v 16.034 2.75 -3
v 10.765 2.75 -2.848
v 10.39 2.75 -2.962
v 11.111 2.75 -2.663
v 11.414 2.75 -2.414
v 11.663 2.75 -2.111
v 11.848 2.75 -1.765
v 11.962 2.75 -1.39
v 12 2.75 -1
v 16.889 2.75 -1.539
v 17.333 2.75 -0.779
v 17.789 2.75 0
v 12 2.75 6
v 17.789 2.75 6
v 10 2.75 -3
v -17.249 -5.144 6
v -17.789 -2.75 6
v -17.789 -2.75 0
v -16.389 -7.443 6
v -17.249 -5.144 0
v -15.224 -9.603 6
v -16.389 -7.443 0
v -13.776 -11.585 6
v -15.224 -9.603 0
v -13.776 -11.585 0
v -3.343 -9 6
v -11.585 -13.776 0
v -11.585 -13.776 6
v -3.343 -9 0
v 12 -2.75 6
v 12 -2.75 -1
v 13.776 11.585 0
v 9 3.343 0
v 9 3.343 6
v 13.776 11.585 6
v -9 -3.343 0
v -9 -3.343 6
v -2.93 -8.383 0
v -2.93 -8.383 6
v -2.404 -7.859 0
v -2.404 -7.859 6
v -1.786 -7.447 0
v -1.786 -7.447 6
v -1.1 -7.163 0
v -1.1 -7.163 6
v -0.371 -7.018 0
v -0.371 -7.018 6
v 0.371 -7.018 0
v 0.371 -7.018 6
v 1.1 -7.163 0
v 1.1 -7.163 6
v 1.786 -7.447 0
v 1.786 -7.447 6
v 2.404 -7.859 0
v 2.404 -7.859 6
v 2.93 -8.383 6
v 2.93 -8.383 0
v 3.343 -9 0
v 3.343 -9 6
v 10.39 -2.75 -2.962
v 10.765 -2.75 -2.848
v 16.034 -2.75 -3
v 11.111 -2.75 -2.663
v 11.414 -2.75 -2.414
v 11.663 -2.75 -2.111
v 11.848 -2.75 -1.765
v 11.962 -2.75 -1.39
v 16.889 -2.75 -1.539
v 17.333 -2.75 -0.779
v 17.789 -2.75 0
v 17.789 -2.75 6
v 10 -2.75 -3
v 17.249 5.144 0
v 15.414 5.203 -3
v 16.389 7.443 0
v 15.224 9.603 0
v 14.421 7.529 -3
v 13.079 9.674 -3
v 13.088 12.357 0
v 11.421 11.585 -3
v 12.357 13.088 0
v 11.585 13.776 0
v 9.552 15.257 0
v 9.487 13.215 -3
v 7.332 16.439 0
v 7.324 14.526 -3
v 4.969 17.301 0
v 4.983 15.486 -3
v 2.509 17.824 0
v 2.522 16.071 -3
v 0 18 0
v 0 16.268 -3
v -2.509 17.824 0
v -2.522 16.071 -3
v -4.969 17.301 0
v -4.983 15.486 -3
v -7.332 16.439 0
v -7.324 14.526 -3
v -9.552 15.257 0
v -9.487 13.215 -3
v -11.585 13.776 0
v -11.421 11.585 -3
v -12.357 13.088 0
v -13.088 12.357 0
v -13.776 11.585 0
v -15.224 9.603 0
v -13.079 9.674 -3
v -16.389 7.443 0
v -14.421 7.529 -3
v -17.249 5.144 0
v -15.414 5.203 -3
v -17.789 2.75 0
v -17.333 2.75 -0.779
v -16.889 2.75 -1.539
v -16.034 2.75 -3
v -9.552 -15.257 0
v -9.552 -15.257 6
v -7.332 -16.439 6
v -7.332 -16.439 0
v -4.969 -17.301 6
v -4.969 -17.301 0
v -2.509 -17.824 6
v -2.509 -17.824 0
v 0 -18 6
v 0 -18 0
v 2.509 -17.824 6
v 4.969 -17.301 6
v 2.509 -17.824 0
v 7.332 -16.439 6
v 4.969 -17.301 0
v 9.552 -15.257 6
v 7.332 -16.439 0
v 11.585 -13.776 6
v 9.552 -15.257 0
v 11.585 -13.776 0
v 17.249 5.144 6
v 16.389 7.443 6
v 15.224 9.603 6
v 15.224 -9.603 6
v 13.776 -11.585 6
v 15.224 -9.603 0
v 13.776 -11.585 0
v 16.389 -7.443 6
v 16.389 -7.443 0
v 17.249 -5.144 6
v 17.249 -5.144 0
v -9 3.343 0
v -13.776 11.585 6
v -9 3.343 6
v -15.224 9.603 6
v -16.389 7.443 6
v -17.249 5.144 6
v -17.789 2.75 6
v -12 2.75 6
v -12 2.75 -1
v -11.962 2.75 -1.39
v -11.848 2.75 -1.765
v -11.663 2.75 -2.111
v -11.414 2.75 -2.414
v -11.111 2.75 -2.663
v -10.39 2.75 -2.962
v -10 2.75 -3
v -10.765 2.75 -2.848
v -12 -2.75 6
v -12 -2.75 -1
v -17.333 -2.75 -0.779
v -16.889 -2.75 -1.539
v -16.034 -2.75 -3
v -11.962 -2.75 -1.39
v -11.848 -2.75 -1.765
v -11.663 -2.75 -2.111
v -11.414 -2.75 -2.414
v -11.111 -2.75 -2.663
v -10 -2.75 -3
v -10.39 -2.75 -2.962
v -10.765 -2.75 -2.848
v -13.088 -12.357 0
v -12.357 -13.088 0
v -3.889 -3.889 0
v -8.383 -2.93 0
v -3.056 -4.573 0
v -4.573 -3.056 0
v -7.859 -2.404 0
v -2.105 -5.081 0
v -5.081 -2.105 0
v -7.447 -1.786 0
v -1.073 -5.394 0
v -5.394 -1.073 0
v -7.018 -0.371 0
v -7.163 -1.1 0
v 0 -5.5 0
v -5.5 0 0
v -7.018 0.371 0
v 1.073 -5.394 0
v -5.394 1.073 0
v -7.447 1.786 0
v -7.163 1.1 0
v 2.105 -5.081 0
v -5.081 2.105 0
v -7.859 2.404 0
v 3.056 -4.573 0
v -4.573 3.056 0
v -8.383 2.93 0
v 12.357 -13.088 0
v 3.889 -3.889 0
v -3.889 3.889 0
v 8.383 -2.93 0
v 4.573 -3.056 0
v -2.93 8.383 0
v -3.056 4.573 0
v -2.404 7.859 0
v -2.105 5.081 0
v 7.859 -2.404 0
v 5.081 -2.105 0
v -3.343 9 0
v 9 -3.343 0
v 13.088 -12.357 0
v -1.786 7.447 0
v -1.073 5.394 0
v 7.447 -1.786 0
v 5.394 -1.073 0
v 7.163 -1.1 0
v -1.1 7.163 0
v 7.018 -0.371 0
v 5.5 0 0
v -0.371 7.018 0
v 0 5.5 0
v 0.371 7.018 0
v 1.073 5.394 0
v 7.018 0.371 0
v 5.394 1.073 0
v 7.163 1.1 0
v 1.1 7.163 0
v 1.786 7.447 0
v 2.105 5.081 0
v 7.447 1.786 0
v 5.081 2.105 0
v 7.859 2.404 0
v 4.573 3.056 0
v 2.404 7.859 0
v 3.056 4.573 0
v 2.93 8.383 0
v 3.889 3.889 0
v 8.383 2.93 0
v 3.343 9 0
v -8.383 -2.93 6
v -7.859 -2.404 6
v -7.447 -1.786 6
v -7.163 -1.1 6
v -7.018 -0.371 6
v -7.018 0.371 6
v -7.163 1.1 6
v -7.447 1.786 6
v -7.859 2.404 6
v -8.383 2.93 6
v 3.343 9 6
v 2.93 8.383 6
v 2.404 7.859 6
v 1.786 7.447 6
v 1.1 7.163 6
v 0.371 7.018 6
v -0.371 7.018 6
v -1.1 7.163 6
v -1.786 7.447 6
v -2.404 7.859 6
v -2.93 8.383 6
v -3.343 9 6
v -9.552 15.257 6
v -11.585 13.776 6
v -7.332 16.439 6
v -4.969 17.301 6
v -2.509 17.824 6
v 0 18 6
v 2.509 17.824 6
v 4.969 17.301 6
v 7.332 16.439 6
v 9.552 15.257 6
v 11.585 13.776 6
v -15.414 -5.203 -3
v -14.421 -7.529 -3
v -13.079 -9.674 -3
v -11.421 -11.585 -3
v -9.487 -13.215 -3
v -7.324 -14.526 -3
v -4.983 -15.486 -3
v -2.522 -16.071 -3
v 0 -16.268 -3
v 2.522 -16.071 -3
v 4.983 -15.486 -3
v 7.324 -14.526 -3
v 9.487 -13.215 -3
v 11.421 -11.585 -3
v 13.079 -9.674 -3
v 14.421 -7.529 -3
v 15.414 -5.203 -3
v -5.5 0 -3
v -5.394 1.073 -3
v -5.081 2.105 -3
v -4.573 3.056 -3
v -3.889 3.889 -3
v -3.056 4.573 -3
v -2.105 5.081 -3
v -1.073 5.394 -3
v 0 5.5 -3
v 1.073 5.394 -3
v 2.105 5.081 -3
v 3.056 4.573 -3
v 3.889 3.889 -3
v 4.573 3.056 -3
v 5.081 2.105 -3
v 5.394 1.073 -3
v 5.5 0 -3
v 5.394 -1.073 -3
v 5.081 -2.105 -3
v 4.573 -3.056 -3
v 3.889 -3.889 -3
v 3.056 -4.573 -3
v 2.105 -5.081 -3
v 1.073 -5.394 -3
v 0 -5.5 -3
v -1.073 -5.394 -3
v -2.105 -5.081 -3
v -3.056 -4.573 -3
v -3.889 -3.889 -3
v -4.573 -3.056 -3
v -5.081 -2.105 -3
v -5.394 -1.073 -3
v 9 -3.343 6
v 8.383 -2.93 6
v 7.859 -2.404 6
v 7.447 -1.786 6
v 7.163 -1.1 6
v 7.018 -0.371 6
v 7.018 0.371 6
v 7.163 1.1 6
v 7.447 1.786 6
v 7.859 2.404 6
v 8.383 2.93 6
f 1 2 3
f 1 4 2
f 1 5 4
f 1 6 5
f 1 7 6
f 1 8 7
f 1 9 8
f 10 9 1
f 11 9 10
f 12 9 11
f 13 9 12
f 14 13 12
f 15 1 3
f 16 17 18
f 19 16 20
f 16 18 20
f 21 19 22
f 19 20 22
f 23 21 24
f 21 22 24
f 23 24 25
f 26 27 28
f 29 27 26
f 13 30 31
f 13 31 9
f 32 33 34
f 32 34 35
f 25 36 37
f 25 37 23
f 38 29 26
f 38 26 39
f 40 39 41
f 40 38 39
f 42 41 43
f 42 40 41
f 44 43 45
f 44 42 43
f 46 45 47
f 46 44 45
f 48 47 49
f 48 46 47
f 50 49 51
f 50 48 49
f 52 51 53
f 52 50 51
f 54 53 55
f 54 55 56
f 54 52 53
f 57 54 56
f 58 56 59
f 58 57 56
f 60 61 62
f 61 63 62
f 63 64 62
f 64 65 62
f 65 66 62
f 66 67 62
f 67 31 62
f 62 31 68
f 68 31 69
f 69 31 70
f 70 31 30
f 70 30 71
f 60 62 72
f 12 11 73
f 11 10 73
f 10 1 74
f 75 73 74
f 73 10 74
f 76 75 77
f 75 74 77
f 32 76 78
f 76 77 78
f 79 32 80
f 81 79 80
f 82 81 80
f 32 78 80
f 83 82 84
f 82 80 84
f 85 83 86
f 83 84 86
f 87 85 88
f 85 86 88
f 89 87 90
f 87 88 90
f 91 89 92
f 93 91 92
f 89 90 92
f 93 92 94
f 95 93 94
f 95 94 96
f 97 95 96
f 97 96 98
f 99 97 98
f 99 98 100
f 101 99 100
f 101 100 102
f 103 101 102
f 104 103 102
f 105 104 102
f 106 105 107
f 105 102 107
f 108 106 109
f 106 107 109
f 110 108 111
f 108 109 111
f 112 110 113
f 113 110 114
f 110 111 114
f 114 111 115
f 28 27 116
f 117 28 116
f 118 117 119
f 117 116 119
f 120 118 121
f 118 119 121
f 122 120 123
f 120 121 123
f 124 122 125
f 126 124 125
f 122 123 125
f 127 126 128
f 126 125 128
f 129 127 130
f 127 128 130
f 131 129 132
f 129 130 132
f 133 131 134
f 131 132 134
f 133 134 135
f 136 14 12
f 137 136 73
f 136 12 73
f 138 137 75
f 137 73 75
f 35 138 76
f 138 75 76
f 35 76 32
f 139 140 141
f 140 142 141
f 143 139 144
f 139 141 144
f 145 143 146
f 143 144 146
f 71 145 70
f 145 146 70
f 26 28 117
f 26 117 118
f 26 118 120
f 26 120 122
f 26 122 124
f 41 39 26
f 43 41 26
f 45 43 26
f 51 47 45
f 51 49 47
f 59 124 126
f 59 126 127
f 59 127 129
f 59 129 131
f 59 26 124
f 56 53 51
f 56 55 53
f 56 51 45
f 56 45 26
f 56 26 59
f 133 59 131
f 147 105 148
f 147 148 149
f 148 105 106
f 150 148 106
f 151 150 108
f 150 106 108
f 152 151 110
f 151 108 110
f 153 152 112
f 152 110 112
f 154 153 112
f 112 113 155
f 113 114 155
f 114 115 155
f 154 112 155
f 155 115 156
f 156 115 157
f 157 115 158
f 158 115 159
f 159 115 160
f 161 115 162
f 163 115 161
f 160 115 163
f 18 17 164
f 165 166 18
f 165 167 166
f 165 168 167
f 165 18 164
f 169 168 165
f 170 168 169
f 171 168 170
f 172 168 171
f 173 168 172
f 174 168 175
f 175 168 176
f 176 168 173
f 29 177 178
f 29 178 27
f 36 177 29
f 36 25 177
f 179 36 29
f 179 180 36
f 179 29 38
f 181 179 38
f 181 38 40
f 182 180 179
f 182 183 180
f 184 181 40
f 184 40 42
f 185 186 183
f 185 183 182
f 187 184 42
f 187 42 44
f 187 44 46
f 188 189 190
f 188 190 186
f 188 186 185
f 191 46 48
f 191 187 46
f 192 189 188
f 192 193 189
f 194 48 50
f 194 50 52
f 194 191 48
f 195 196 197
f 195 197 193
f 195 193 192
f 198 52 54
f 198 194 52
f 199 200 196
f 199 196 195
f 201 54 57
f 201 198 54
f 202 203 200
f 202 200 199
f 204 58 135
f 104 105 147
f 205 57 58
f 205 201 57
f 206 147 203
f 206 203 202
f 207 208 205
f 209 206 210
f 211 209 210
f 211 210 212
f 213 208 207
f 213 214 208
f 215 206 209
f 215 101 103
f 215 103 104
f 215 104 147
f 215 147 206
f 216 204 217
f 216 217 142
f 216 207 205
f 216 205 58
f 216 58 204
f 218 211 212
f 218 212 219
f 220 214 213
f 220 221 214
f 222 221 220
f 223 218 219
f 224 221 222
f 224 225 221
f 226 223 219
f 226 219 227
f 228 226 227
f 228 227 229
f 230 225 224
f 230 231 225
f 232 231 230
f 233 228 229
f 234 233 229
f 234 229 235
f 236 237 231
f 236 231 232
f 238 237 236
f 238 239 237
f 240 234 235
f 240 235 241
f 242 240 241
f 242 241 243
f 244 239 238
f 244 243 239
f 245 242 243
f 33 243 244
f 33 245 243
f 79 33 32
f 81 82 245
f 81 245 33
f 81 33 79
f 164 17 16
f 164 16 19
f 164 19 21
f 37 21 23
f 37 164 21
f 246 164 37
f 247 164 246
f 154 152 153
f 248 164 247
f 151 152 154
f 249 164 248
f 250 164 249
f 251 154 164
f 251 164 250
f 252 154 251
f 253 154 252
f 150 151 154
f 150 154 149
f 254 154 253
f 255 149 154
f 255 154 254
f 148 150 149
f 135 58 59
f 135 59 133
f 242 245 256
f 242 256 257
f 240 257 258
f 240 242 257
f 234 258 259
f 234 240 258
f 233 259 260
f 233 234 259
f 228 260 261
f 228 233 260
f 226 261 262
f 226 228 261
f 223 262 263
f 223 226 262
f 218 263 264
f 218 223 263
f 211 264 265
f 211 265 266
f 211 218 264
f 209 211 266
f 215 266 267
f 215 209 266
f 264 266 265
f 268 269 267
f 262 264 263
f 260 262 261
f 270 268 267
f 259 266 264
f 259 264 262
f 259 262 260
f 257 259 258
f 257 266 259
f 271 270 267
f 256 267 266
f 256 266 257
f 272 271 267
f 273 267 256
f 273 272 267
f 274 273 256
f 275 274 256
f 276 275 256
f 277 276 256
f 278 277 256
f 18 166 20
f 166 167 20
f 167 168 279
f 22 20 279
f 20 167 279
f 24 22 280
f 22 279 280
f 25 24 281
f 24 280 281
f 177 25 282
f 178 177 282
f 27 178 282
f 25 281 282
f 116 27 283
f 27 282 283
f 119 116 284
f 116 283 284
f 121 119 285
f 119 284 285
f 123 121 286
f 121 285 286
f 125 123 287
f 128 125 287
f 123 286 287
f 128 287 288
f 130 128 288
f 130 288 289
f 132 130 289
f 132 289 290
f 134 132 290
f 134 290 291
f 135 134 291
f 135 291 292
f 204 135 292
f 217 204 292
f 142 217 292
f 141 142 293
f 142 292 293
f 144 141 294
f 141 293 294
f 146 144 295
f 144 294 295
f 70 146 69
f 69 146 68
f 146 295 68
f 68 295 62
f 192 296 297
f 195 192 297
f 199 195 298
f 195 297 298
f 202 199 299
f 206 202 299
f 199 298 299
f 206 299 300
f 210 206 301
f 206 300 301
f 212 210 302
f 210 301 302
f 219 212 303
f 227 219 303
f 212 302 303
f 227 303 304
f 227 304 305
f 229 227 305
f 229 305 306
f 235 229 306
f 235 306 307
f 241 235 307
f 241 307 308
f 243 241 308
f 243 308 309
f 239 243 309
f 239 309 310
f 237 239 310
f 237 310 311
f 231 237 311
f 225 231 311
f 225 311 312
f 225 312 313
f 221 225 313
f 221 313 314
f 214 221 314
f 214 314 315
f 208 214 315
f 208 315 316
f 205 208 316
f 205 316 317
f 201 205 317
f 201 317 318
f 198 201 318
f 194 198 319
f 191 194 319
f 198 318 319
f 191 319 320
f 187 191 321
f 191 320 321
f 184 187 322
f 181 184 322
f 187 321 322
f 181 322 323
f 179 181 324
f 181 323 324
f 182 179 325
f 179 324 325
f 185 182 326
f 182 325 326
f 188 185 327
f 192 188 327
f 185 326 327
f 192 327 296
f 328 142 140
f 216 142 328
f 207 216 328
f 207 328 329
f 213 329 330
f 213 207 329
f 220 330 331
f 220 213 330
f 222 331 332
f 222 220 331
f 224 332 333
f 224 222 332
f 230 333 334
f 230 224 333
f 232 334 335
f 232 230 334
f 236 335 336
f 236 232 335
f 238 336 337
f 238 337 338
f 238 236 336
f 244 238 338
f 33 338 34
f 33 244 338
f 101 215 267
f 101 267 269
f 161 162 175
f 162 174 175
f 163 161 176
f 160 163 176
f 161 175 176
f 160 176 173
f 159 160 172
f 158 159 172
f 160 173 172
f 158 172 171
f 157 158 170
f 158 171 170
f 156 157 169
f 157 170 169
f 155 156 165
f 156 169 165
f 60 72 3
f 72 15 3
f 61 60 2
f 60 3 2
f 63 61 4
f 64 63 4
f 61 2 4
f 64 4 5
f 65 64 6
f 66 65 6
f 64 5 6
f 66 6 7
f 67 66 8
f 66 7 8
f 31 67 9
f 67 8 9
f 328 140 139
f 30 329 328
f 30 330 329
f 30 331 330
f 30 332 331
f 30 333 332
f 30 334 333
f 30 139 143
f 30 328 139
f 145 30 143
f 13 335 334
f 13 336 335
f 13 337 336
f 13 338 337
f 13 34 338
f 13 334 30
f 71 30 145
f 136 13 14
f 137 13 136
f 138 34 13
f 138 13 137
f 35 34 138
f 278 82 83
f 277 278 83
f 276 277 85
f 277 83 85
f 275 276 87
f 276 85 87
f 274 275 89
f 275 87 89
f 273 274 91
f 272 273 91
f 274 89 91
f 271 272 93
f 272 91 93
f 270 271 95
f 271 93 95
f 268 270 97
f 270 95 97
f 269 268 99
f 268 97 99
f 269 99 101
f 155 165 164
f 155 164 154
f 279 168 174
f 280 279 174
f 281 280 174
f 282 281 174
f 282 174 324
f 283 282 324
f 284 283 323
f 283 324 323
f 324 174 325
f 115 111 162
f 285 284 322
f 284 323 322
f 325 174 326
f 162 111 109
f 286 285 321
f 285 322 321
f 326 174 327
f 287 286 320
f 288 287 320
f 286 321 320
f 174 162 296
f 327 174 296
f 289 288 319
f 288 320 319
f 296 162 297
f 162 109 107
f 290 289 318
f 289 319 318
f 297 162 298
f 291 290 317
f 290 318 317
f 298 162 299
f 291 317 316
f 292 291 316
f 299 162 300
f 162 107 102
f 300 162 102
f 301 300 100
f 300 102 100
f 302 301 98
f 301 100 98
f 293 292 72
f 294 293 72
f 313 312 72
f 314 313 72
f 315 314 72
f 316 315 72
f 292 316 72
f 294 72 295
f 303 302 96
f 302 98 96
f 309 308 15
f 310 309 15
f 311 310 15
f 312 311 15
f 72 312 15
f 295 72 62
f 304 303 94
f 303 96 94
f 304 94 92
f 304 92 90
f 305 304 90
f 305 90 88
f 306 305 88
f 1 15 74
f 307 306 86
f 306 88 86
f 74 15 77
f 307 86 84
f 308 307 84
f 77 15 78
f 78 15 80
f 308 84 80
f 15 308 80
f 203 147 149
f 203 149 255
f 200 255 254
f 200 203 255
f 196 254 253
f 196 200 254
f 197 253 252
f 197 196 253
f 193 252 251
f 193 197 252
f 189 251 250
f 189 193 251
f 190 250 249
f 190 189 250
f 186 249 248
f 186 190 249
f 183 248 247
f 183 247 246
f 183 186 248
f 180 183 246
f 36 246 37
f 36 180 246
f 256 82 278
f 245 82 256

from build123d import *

# Parameters (mm, degrees)
F0_R          = 18
F1_DEPTH      = 6
F1_DEPTH_BACK = 3
F1_TAPER_BACK = 30
F3_DEPTH      = 6.001
F5_D          = 11
F6_W          = 20
F6_H          = 5.5
F7_DEPTH      = 12.5
F8_R          = 2


with BuildPart() as f1:
    # F0 (on Top) → F1 (new body, two sides)
    with BuildSketch(Plane.XY) as f1_sk:
        Circle(F0_R)
    extrude(amount=F1_DEPTH)
    extrude(f1_sk.sketch, amount=-F1_DEPTH_BACK, taper=F1_TAPER_BACK)

    # F2 (on Top) → F3 (cut, through all)
    with BuildSketch(Plane.XY):
        with BuildLine():
            Line((-3.3431457505, 9), (-12.571075856, 14.3476765405))
            ThreePointArc((-12.571075856, 14.3476765405), (-14.1421356237, 14.1421356237), (-14.3476765405, 12.571075856))
            Line((-14.3476765405, 12.571075856), (-9, 3.3431457505))
            ThreePointArc((-9, 3.3431457505), (-7, 0), (-9, -3.3431457505))
            Line((-9, -3.3431457505), (-14.3476765405, -12.571075856))
            ThreePointArc((-14.3476765405, -12.571075856), (-14.1421356237, -14.1421356237), (-12.571075856, -14.3476765405))
            Line((-12.571075856, -14.3476765405), (-3.3431457505, -9))
            ThreePointArc((-3.3431457505, -9), (0, -7), (3.3431457505, -9))
            Line((3.3431457505, -9), (12.571075856, -14.3476765405))
            ThreePointArc((12.571075856, -14.3476765405), (14.1421356237, -14.1421356237), (14.3476765405, -12.571075856))
            Line((14.3476765405, -12.571075856), (9, -3.3431457505))
            ThreePointArc((9, -3.3431457505), (7, 0), (9, 3.3431457505))
            Line((9, 3.3431457505), (14.3476765405, 12.571075856))
            ThreePointArc((14.3476765405, 12.571075856), (14.1421356237, 14.1421356237), (12.571075856, 14.3476765405))
            Line((12.571075856, 14.3476765405), (3.3431457505, 9))
            ThreePointArc((3.3431457505, 9), (0, 7), (-3.3431457505, 9))
        make_face()
    extrude(amount=F3_DEPTH, mode=Mode.SUBTRACT)

    # F5 (through all)
    with Locations(Plane.XY):
        with Locations((0, 0)):
            Hole(F5_D / 2)

    # F6 (on Top) → F7 (cut, symmetric)
    with BuildSketch(Plane.XY):
        with Locations((-22, 0)):
            Rectangle(F6_W, F6_H)
        with Locations((22, 0)):
            Rectangle(F6_W, F6_H)
    extrude(amount=F7_DEPTH, both=True, mode=Mode.SUBTRACT)

    # F8
    f8_edges = [f1.edges().sort_by_distance(p)[0] for p in [
        (-12, 0, -3),
        (12, 0, -3),
    ]]
    fillet(f8_edges, radius=F8_R)


solid = f1.part
